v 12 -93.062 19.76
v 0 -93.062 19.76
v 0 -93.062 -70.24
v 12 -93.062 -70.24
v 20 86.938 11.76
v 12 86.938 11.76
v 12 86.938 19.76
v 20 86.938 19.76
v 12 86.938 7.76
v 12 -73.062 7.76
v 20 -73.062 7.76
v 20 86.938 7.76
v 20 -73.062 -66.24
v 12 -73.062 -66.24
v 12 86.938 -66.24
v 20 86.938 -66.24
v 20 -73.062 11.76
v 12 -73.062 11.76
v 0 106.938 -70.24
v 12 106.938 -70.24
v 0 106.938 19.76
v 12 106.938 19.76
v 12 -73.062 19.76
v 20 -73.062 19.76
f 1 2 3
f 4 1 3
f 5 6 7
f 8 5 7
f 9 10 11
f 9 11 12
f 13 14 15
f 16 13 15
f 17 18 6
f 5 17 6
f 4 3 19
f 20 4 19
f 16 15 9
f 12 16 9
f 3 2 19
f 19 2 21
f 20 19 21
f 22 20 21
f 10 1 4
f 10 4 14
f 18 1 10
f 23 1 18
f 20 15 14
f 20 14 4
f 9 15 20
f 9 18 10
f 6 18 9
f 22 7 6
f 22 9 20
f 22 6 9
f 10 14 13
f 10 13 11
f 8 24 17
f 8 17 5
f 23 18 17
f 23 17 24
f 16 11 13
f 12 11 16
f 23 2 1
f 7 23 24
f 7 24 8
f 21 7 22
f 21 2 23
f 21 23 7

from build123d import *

# Parameters (mm, degrees)
F0_W     = 160
F0_H     = 74
F1_DEPTH = 12
F0_H_2   = 8
F2_DEPTH = 20


with BuildPart() as f1:
    # F0 (on Right) → F1 (new body)
    with BuildSketch(Plane.YZ):
        Polygon((-73.062379, 19.760398), (-93.062379, 19.760398), (-93.062379, -70.239602), (106.937621, -70.239602), (106.937621, 19.760398), (86.937621, 19.760398), (86.937621, 11.760398), (-73.062379, 11.760398), align=None)
        with Locations((6.937621, -29.239602)):
            Rectangle(F0_W, F0_H, mode=Mode.SUBTRACT)
    extrude(amount=F1_DEPTH)

    # F0 (on Right) → F2 (join)
    with BuildSketch(Plane.YZ):
        with Locations((6.937621, 15.760398)):
            Rectangle(F0_W, F0_H_2)
        with Locations((6.937621, -29.239602)):
            Rectangle(F0_W, F0_H)
    extrude(amount=F2_DEPTH)


solid = f1.part
